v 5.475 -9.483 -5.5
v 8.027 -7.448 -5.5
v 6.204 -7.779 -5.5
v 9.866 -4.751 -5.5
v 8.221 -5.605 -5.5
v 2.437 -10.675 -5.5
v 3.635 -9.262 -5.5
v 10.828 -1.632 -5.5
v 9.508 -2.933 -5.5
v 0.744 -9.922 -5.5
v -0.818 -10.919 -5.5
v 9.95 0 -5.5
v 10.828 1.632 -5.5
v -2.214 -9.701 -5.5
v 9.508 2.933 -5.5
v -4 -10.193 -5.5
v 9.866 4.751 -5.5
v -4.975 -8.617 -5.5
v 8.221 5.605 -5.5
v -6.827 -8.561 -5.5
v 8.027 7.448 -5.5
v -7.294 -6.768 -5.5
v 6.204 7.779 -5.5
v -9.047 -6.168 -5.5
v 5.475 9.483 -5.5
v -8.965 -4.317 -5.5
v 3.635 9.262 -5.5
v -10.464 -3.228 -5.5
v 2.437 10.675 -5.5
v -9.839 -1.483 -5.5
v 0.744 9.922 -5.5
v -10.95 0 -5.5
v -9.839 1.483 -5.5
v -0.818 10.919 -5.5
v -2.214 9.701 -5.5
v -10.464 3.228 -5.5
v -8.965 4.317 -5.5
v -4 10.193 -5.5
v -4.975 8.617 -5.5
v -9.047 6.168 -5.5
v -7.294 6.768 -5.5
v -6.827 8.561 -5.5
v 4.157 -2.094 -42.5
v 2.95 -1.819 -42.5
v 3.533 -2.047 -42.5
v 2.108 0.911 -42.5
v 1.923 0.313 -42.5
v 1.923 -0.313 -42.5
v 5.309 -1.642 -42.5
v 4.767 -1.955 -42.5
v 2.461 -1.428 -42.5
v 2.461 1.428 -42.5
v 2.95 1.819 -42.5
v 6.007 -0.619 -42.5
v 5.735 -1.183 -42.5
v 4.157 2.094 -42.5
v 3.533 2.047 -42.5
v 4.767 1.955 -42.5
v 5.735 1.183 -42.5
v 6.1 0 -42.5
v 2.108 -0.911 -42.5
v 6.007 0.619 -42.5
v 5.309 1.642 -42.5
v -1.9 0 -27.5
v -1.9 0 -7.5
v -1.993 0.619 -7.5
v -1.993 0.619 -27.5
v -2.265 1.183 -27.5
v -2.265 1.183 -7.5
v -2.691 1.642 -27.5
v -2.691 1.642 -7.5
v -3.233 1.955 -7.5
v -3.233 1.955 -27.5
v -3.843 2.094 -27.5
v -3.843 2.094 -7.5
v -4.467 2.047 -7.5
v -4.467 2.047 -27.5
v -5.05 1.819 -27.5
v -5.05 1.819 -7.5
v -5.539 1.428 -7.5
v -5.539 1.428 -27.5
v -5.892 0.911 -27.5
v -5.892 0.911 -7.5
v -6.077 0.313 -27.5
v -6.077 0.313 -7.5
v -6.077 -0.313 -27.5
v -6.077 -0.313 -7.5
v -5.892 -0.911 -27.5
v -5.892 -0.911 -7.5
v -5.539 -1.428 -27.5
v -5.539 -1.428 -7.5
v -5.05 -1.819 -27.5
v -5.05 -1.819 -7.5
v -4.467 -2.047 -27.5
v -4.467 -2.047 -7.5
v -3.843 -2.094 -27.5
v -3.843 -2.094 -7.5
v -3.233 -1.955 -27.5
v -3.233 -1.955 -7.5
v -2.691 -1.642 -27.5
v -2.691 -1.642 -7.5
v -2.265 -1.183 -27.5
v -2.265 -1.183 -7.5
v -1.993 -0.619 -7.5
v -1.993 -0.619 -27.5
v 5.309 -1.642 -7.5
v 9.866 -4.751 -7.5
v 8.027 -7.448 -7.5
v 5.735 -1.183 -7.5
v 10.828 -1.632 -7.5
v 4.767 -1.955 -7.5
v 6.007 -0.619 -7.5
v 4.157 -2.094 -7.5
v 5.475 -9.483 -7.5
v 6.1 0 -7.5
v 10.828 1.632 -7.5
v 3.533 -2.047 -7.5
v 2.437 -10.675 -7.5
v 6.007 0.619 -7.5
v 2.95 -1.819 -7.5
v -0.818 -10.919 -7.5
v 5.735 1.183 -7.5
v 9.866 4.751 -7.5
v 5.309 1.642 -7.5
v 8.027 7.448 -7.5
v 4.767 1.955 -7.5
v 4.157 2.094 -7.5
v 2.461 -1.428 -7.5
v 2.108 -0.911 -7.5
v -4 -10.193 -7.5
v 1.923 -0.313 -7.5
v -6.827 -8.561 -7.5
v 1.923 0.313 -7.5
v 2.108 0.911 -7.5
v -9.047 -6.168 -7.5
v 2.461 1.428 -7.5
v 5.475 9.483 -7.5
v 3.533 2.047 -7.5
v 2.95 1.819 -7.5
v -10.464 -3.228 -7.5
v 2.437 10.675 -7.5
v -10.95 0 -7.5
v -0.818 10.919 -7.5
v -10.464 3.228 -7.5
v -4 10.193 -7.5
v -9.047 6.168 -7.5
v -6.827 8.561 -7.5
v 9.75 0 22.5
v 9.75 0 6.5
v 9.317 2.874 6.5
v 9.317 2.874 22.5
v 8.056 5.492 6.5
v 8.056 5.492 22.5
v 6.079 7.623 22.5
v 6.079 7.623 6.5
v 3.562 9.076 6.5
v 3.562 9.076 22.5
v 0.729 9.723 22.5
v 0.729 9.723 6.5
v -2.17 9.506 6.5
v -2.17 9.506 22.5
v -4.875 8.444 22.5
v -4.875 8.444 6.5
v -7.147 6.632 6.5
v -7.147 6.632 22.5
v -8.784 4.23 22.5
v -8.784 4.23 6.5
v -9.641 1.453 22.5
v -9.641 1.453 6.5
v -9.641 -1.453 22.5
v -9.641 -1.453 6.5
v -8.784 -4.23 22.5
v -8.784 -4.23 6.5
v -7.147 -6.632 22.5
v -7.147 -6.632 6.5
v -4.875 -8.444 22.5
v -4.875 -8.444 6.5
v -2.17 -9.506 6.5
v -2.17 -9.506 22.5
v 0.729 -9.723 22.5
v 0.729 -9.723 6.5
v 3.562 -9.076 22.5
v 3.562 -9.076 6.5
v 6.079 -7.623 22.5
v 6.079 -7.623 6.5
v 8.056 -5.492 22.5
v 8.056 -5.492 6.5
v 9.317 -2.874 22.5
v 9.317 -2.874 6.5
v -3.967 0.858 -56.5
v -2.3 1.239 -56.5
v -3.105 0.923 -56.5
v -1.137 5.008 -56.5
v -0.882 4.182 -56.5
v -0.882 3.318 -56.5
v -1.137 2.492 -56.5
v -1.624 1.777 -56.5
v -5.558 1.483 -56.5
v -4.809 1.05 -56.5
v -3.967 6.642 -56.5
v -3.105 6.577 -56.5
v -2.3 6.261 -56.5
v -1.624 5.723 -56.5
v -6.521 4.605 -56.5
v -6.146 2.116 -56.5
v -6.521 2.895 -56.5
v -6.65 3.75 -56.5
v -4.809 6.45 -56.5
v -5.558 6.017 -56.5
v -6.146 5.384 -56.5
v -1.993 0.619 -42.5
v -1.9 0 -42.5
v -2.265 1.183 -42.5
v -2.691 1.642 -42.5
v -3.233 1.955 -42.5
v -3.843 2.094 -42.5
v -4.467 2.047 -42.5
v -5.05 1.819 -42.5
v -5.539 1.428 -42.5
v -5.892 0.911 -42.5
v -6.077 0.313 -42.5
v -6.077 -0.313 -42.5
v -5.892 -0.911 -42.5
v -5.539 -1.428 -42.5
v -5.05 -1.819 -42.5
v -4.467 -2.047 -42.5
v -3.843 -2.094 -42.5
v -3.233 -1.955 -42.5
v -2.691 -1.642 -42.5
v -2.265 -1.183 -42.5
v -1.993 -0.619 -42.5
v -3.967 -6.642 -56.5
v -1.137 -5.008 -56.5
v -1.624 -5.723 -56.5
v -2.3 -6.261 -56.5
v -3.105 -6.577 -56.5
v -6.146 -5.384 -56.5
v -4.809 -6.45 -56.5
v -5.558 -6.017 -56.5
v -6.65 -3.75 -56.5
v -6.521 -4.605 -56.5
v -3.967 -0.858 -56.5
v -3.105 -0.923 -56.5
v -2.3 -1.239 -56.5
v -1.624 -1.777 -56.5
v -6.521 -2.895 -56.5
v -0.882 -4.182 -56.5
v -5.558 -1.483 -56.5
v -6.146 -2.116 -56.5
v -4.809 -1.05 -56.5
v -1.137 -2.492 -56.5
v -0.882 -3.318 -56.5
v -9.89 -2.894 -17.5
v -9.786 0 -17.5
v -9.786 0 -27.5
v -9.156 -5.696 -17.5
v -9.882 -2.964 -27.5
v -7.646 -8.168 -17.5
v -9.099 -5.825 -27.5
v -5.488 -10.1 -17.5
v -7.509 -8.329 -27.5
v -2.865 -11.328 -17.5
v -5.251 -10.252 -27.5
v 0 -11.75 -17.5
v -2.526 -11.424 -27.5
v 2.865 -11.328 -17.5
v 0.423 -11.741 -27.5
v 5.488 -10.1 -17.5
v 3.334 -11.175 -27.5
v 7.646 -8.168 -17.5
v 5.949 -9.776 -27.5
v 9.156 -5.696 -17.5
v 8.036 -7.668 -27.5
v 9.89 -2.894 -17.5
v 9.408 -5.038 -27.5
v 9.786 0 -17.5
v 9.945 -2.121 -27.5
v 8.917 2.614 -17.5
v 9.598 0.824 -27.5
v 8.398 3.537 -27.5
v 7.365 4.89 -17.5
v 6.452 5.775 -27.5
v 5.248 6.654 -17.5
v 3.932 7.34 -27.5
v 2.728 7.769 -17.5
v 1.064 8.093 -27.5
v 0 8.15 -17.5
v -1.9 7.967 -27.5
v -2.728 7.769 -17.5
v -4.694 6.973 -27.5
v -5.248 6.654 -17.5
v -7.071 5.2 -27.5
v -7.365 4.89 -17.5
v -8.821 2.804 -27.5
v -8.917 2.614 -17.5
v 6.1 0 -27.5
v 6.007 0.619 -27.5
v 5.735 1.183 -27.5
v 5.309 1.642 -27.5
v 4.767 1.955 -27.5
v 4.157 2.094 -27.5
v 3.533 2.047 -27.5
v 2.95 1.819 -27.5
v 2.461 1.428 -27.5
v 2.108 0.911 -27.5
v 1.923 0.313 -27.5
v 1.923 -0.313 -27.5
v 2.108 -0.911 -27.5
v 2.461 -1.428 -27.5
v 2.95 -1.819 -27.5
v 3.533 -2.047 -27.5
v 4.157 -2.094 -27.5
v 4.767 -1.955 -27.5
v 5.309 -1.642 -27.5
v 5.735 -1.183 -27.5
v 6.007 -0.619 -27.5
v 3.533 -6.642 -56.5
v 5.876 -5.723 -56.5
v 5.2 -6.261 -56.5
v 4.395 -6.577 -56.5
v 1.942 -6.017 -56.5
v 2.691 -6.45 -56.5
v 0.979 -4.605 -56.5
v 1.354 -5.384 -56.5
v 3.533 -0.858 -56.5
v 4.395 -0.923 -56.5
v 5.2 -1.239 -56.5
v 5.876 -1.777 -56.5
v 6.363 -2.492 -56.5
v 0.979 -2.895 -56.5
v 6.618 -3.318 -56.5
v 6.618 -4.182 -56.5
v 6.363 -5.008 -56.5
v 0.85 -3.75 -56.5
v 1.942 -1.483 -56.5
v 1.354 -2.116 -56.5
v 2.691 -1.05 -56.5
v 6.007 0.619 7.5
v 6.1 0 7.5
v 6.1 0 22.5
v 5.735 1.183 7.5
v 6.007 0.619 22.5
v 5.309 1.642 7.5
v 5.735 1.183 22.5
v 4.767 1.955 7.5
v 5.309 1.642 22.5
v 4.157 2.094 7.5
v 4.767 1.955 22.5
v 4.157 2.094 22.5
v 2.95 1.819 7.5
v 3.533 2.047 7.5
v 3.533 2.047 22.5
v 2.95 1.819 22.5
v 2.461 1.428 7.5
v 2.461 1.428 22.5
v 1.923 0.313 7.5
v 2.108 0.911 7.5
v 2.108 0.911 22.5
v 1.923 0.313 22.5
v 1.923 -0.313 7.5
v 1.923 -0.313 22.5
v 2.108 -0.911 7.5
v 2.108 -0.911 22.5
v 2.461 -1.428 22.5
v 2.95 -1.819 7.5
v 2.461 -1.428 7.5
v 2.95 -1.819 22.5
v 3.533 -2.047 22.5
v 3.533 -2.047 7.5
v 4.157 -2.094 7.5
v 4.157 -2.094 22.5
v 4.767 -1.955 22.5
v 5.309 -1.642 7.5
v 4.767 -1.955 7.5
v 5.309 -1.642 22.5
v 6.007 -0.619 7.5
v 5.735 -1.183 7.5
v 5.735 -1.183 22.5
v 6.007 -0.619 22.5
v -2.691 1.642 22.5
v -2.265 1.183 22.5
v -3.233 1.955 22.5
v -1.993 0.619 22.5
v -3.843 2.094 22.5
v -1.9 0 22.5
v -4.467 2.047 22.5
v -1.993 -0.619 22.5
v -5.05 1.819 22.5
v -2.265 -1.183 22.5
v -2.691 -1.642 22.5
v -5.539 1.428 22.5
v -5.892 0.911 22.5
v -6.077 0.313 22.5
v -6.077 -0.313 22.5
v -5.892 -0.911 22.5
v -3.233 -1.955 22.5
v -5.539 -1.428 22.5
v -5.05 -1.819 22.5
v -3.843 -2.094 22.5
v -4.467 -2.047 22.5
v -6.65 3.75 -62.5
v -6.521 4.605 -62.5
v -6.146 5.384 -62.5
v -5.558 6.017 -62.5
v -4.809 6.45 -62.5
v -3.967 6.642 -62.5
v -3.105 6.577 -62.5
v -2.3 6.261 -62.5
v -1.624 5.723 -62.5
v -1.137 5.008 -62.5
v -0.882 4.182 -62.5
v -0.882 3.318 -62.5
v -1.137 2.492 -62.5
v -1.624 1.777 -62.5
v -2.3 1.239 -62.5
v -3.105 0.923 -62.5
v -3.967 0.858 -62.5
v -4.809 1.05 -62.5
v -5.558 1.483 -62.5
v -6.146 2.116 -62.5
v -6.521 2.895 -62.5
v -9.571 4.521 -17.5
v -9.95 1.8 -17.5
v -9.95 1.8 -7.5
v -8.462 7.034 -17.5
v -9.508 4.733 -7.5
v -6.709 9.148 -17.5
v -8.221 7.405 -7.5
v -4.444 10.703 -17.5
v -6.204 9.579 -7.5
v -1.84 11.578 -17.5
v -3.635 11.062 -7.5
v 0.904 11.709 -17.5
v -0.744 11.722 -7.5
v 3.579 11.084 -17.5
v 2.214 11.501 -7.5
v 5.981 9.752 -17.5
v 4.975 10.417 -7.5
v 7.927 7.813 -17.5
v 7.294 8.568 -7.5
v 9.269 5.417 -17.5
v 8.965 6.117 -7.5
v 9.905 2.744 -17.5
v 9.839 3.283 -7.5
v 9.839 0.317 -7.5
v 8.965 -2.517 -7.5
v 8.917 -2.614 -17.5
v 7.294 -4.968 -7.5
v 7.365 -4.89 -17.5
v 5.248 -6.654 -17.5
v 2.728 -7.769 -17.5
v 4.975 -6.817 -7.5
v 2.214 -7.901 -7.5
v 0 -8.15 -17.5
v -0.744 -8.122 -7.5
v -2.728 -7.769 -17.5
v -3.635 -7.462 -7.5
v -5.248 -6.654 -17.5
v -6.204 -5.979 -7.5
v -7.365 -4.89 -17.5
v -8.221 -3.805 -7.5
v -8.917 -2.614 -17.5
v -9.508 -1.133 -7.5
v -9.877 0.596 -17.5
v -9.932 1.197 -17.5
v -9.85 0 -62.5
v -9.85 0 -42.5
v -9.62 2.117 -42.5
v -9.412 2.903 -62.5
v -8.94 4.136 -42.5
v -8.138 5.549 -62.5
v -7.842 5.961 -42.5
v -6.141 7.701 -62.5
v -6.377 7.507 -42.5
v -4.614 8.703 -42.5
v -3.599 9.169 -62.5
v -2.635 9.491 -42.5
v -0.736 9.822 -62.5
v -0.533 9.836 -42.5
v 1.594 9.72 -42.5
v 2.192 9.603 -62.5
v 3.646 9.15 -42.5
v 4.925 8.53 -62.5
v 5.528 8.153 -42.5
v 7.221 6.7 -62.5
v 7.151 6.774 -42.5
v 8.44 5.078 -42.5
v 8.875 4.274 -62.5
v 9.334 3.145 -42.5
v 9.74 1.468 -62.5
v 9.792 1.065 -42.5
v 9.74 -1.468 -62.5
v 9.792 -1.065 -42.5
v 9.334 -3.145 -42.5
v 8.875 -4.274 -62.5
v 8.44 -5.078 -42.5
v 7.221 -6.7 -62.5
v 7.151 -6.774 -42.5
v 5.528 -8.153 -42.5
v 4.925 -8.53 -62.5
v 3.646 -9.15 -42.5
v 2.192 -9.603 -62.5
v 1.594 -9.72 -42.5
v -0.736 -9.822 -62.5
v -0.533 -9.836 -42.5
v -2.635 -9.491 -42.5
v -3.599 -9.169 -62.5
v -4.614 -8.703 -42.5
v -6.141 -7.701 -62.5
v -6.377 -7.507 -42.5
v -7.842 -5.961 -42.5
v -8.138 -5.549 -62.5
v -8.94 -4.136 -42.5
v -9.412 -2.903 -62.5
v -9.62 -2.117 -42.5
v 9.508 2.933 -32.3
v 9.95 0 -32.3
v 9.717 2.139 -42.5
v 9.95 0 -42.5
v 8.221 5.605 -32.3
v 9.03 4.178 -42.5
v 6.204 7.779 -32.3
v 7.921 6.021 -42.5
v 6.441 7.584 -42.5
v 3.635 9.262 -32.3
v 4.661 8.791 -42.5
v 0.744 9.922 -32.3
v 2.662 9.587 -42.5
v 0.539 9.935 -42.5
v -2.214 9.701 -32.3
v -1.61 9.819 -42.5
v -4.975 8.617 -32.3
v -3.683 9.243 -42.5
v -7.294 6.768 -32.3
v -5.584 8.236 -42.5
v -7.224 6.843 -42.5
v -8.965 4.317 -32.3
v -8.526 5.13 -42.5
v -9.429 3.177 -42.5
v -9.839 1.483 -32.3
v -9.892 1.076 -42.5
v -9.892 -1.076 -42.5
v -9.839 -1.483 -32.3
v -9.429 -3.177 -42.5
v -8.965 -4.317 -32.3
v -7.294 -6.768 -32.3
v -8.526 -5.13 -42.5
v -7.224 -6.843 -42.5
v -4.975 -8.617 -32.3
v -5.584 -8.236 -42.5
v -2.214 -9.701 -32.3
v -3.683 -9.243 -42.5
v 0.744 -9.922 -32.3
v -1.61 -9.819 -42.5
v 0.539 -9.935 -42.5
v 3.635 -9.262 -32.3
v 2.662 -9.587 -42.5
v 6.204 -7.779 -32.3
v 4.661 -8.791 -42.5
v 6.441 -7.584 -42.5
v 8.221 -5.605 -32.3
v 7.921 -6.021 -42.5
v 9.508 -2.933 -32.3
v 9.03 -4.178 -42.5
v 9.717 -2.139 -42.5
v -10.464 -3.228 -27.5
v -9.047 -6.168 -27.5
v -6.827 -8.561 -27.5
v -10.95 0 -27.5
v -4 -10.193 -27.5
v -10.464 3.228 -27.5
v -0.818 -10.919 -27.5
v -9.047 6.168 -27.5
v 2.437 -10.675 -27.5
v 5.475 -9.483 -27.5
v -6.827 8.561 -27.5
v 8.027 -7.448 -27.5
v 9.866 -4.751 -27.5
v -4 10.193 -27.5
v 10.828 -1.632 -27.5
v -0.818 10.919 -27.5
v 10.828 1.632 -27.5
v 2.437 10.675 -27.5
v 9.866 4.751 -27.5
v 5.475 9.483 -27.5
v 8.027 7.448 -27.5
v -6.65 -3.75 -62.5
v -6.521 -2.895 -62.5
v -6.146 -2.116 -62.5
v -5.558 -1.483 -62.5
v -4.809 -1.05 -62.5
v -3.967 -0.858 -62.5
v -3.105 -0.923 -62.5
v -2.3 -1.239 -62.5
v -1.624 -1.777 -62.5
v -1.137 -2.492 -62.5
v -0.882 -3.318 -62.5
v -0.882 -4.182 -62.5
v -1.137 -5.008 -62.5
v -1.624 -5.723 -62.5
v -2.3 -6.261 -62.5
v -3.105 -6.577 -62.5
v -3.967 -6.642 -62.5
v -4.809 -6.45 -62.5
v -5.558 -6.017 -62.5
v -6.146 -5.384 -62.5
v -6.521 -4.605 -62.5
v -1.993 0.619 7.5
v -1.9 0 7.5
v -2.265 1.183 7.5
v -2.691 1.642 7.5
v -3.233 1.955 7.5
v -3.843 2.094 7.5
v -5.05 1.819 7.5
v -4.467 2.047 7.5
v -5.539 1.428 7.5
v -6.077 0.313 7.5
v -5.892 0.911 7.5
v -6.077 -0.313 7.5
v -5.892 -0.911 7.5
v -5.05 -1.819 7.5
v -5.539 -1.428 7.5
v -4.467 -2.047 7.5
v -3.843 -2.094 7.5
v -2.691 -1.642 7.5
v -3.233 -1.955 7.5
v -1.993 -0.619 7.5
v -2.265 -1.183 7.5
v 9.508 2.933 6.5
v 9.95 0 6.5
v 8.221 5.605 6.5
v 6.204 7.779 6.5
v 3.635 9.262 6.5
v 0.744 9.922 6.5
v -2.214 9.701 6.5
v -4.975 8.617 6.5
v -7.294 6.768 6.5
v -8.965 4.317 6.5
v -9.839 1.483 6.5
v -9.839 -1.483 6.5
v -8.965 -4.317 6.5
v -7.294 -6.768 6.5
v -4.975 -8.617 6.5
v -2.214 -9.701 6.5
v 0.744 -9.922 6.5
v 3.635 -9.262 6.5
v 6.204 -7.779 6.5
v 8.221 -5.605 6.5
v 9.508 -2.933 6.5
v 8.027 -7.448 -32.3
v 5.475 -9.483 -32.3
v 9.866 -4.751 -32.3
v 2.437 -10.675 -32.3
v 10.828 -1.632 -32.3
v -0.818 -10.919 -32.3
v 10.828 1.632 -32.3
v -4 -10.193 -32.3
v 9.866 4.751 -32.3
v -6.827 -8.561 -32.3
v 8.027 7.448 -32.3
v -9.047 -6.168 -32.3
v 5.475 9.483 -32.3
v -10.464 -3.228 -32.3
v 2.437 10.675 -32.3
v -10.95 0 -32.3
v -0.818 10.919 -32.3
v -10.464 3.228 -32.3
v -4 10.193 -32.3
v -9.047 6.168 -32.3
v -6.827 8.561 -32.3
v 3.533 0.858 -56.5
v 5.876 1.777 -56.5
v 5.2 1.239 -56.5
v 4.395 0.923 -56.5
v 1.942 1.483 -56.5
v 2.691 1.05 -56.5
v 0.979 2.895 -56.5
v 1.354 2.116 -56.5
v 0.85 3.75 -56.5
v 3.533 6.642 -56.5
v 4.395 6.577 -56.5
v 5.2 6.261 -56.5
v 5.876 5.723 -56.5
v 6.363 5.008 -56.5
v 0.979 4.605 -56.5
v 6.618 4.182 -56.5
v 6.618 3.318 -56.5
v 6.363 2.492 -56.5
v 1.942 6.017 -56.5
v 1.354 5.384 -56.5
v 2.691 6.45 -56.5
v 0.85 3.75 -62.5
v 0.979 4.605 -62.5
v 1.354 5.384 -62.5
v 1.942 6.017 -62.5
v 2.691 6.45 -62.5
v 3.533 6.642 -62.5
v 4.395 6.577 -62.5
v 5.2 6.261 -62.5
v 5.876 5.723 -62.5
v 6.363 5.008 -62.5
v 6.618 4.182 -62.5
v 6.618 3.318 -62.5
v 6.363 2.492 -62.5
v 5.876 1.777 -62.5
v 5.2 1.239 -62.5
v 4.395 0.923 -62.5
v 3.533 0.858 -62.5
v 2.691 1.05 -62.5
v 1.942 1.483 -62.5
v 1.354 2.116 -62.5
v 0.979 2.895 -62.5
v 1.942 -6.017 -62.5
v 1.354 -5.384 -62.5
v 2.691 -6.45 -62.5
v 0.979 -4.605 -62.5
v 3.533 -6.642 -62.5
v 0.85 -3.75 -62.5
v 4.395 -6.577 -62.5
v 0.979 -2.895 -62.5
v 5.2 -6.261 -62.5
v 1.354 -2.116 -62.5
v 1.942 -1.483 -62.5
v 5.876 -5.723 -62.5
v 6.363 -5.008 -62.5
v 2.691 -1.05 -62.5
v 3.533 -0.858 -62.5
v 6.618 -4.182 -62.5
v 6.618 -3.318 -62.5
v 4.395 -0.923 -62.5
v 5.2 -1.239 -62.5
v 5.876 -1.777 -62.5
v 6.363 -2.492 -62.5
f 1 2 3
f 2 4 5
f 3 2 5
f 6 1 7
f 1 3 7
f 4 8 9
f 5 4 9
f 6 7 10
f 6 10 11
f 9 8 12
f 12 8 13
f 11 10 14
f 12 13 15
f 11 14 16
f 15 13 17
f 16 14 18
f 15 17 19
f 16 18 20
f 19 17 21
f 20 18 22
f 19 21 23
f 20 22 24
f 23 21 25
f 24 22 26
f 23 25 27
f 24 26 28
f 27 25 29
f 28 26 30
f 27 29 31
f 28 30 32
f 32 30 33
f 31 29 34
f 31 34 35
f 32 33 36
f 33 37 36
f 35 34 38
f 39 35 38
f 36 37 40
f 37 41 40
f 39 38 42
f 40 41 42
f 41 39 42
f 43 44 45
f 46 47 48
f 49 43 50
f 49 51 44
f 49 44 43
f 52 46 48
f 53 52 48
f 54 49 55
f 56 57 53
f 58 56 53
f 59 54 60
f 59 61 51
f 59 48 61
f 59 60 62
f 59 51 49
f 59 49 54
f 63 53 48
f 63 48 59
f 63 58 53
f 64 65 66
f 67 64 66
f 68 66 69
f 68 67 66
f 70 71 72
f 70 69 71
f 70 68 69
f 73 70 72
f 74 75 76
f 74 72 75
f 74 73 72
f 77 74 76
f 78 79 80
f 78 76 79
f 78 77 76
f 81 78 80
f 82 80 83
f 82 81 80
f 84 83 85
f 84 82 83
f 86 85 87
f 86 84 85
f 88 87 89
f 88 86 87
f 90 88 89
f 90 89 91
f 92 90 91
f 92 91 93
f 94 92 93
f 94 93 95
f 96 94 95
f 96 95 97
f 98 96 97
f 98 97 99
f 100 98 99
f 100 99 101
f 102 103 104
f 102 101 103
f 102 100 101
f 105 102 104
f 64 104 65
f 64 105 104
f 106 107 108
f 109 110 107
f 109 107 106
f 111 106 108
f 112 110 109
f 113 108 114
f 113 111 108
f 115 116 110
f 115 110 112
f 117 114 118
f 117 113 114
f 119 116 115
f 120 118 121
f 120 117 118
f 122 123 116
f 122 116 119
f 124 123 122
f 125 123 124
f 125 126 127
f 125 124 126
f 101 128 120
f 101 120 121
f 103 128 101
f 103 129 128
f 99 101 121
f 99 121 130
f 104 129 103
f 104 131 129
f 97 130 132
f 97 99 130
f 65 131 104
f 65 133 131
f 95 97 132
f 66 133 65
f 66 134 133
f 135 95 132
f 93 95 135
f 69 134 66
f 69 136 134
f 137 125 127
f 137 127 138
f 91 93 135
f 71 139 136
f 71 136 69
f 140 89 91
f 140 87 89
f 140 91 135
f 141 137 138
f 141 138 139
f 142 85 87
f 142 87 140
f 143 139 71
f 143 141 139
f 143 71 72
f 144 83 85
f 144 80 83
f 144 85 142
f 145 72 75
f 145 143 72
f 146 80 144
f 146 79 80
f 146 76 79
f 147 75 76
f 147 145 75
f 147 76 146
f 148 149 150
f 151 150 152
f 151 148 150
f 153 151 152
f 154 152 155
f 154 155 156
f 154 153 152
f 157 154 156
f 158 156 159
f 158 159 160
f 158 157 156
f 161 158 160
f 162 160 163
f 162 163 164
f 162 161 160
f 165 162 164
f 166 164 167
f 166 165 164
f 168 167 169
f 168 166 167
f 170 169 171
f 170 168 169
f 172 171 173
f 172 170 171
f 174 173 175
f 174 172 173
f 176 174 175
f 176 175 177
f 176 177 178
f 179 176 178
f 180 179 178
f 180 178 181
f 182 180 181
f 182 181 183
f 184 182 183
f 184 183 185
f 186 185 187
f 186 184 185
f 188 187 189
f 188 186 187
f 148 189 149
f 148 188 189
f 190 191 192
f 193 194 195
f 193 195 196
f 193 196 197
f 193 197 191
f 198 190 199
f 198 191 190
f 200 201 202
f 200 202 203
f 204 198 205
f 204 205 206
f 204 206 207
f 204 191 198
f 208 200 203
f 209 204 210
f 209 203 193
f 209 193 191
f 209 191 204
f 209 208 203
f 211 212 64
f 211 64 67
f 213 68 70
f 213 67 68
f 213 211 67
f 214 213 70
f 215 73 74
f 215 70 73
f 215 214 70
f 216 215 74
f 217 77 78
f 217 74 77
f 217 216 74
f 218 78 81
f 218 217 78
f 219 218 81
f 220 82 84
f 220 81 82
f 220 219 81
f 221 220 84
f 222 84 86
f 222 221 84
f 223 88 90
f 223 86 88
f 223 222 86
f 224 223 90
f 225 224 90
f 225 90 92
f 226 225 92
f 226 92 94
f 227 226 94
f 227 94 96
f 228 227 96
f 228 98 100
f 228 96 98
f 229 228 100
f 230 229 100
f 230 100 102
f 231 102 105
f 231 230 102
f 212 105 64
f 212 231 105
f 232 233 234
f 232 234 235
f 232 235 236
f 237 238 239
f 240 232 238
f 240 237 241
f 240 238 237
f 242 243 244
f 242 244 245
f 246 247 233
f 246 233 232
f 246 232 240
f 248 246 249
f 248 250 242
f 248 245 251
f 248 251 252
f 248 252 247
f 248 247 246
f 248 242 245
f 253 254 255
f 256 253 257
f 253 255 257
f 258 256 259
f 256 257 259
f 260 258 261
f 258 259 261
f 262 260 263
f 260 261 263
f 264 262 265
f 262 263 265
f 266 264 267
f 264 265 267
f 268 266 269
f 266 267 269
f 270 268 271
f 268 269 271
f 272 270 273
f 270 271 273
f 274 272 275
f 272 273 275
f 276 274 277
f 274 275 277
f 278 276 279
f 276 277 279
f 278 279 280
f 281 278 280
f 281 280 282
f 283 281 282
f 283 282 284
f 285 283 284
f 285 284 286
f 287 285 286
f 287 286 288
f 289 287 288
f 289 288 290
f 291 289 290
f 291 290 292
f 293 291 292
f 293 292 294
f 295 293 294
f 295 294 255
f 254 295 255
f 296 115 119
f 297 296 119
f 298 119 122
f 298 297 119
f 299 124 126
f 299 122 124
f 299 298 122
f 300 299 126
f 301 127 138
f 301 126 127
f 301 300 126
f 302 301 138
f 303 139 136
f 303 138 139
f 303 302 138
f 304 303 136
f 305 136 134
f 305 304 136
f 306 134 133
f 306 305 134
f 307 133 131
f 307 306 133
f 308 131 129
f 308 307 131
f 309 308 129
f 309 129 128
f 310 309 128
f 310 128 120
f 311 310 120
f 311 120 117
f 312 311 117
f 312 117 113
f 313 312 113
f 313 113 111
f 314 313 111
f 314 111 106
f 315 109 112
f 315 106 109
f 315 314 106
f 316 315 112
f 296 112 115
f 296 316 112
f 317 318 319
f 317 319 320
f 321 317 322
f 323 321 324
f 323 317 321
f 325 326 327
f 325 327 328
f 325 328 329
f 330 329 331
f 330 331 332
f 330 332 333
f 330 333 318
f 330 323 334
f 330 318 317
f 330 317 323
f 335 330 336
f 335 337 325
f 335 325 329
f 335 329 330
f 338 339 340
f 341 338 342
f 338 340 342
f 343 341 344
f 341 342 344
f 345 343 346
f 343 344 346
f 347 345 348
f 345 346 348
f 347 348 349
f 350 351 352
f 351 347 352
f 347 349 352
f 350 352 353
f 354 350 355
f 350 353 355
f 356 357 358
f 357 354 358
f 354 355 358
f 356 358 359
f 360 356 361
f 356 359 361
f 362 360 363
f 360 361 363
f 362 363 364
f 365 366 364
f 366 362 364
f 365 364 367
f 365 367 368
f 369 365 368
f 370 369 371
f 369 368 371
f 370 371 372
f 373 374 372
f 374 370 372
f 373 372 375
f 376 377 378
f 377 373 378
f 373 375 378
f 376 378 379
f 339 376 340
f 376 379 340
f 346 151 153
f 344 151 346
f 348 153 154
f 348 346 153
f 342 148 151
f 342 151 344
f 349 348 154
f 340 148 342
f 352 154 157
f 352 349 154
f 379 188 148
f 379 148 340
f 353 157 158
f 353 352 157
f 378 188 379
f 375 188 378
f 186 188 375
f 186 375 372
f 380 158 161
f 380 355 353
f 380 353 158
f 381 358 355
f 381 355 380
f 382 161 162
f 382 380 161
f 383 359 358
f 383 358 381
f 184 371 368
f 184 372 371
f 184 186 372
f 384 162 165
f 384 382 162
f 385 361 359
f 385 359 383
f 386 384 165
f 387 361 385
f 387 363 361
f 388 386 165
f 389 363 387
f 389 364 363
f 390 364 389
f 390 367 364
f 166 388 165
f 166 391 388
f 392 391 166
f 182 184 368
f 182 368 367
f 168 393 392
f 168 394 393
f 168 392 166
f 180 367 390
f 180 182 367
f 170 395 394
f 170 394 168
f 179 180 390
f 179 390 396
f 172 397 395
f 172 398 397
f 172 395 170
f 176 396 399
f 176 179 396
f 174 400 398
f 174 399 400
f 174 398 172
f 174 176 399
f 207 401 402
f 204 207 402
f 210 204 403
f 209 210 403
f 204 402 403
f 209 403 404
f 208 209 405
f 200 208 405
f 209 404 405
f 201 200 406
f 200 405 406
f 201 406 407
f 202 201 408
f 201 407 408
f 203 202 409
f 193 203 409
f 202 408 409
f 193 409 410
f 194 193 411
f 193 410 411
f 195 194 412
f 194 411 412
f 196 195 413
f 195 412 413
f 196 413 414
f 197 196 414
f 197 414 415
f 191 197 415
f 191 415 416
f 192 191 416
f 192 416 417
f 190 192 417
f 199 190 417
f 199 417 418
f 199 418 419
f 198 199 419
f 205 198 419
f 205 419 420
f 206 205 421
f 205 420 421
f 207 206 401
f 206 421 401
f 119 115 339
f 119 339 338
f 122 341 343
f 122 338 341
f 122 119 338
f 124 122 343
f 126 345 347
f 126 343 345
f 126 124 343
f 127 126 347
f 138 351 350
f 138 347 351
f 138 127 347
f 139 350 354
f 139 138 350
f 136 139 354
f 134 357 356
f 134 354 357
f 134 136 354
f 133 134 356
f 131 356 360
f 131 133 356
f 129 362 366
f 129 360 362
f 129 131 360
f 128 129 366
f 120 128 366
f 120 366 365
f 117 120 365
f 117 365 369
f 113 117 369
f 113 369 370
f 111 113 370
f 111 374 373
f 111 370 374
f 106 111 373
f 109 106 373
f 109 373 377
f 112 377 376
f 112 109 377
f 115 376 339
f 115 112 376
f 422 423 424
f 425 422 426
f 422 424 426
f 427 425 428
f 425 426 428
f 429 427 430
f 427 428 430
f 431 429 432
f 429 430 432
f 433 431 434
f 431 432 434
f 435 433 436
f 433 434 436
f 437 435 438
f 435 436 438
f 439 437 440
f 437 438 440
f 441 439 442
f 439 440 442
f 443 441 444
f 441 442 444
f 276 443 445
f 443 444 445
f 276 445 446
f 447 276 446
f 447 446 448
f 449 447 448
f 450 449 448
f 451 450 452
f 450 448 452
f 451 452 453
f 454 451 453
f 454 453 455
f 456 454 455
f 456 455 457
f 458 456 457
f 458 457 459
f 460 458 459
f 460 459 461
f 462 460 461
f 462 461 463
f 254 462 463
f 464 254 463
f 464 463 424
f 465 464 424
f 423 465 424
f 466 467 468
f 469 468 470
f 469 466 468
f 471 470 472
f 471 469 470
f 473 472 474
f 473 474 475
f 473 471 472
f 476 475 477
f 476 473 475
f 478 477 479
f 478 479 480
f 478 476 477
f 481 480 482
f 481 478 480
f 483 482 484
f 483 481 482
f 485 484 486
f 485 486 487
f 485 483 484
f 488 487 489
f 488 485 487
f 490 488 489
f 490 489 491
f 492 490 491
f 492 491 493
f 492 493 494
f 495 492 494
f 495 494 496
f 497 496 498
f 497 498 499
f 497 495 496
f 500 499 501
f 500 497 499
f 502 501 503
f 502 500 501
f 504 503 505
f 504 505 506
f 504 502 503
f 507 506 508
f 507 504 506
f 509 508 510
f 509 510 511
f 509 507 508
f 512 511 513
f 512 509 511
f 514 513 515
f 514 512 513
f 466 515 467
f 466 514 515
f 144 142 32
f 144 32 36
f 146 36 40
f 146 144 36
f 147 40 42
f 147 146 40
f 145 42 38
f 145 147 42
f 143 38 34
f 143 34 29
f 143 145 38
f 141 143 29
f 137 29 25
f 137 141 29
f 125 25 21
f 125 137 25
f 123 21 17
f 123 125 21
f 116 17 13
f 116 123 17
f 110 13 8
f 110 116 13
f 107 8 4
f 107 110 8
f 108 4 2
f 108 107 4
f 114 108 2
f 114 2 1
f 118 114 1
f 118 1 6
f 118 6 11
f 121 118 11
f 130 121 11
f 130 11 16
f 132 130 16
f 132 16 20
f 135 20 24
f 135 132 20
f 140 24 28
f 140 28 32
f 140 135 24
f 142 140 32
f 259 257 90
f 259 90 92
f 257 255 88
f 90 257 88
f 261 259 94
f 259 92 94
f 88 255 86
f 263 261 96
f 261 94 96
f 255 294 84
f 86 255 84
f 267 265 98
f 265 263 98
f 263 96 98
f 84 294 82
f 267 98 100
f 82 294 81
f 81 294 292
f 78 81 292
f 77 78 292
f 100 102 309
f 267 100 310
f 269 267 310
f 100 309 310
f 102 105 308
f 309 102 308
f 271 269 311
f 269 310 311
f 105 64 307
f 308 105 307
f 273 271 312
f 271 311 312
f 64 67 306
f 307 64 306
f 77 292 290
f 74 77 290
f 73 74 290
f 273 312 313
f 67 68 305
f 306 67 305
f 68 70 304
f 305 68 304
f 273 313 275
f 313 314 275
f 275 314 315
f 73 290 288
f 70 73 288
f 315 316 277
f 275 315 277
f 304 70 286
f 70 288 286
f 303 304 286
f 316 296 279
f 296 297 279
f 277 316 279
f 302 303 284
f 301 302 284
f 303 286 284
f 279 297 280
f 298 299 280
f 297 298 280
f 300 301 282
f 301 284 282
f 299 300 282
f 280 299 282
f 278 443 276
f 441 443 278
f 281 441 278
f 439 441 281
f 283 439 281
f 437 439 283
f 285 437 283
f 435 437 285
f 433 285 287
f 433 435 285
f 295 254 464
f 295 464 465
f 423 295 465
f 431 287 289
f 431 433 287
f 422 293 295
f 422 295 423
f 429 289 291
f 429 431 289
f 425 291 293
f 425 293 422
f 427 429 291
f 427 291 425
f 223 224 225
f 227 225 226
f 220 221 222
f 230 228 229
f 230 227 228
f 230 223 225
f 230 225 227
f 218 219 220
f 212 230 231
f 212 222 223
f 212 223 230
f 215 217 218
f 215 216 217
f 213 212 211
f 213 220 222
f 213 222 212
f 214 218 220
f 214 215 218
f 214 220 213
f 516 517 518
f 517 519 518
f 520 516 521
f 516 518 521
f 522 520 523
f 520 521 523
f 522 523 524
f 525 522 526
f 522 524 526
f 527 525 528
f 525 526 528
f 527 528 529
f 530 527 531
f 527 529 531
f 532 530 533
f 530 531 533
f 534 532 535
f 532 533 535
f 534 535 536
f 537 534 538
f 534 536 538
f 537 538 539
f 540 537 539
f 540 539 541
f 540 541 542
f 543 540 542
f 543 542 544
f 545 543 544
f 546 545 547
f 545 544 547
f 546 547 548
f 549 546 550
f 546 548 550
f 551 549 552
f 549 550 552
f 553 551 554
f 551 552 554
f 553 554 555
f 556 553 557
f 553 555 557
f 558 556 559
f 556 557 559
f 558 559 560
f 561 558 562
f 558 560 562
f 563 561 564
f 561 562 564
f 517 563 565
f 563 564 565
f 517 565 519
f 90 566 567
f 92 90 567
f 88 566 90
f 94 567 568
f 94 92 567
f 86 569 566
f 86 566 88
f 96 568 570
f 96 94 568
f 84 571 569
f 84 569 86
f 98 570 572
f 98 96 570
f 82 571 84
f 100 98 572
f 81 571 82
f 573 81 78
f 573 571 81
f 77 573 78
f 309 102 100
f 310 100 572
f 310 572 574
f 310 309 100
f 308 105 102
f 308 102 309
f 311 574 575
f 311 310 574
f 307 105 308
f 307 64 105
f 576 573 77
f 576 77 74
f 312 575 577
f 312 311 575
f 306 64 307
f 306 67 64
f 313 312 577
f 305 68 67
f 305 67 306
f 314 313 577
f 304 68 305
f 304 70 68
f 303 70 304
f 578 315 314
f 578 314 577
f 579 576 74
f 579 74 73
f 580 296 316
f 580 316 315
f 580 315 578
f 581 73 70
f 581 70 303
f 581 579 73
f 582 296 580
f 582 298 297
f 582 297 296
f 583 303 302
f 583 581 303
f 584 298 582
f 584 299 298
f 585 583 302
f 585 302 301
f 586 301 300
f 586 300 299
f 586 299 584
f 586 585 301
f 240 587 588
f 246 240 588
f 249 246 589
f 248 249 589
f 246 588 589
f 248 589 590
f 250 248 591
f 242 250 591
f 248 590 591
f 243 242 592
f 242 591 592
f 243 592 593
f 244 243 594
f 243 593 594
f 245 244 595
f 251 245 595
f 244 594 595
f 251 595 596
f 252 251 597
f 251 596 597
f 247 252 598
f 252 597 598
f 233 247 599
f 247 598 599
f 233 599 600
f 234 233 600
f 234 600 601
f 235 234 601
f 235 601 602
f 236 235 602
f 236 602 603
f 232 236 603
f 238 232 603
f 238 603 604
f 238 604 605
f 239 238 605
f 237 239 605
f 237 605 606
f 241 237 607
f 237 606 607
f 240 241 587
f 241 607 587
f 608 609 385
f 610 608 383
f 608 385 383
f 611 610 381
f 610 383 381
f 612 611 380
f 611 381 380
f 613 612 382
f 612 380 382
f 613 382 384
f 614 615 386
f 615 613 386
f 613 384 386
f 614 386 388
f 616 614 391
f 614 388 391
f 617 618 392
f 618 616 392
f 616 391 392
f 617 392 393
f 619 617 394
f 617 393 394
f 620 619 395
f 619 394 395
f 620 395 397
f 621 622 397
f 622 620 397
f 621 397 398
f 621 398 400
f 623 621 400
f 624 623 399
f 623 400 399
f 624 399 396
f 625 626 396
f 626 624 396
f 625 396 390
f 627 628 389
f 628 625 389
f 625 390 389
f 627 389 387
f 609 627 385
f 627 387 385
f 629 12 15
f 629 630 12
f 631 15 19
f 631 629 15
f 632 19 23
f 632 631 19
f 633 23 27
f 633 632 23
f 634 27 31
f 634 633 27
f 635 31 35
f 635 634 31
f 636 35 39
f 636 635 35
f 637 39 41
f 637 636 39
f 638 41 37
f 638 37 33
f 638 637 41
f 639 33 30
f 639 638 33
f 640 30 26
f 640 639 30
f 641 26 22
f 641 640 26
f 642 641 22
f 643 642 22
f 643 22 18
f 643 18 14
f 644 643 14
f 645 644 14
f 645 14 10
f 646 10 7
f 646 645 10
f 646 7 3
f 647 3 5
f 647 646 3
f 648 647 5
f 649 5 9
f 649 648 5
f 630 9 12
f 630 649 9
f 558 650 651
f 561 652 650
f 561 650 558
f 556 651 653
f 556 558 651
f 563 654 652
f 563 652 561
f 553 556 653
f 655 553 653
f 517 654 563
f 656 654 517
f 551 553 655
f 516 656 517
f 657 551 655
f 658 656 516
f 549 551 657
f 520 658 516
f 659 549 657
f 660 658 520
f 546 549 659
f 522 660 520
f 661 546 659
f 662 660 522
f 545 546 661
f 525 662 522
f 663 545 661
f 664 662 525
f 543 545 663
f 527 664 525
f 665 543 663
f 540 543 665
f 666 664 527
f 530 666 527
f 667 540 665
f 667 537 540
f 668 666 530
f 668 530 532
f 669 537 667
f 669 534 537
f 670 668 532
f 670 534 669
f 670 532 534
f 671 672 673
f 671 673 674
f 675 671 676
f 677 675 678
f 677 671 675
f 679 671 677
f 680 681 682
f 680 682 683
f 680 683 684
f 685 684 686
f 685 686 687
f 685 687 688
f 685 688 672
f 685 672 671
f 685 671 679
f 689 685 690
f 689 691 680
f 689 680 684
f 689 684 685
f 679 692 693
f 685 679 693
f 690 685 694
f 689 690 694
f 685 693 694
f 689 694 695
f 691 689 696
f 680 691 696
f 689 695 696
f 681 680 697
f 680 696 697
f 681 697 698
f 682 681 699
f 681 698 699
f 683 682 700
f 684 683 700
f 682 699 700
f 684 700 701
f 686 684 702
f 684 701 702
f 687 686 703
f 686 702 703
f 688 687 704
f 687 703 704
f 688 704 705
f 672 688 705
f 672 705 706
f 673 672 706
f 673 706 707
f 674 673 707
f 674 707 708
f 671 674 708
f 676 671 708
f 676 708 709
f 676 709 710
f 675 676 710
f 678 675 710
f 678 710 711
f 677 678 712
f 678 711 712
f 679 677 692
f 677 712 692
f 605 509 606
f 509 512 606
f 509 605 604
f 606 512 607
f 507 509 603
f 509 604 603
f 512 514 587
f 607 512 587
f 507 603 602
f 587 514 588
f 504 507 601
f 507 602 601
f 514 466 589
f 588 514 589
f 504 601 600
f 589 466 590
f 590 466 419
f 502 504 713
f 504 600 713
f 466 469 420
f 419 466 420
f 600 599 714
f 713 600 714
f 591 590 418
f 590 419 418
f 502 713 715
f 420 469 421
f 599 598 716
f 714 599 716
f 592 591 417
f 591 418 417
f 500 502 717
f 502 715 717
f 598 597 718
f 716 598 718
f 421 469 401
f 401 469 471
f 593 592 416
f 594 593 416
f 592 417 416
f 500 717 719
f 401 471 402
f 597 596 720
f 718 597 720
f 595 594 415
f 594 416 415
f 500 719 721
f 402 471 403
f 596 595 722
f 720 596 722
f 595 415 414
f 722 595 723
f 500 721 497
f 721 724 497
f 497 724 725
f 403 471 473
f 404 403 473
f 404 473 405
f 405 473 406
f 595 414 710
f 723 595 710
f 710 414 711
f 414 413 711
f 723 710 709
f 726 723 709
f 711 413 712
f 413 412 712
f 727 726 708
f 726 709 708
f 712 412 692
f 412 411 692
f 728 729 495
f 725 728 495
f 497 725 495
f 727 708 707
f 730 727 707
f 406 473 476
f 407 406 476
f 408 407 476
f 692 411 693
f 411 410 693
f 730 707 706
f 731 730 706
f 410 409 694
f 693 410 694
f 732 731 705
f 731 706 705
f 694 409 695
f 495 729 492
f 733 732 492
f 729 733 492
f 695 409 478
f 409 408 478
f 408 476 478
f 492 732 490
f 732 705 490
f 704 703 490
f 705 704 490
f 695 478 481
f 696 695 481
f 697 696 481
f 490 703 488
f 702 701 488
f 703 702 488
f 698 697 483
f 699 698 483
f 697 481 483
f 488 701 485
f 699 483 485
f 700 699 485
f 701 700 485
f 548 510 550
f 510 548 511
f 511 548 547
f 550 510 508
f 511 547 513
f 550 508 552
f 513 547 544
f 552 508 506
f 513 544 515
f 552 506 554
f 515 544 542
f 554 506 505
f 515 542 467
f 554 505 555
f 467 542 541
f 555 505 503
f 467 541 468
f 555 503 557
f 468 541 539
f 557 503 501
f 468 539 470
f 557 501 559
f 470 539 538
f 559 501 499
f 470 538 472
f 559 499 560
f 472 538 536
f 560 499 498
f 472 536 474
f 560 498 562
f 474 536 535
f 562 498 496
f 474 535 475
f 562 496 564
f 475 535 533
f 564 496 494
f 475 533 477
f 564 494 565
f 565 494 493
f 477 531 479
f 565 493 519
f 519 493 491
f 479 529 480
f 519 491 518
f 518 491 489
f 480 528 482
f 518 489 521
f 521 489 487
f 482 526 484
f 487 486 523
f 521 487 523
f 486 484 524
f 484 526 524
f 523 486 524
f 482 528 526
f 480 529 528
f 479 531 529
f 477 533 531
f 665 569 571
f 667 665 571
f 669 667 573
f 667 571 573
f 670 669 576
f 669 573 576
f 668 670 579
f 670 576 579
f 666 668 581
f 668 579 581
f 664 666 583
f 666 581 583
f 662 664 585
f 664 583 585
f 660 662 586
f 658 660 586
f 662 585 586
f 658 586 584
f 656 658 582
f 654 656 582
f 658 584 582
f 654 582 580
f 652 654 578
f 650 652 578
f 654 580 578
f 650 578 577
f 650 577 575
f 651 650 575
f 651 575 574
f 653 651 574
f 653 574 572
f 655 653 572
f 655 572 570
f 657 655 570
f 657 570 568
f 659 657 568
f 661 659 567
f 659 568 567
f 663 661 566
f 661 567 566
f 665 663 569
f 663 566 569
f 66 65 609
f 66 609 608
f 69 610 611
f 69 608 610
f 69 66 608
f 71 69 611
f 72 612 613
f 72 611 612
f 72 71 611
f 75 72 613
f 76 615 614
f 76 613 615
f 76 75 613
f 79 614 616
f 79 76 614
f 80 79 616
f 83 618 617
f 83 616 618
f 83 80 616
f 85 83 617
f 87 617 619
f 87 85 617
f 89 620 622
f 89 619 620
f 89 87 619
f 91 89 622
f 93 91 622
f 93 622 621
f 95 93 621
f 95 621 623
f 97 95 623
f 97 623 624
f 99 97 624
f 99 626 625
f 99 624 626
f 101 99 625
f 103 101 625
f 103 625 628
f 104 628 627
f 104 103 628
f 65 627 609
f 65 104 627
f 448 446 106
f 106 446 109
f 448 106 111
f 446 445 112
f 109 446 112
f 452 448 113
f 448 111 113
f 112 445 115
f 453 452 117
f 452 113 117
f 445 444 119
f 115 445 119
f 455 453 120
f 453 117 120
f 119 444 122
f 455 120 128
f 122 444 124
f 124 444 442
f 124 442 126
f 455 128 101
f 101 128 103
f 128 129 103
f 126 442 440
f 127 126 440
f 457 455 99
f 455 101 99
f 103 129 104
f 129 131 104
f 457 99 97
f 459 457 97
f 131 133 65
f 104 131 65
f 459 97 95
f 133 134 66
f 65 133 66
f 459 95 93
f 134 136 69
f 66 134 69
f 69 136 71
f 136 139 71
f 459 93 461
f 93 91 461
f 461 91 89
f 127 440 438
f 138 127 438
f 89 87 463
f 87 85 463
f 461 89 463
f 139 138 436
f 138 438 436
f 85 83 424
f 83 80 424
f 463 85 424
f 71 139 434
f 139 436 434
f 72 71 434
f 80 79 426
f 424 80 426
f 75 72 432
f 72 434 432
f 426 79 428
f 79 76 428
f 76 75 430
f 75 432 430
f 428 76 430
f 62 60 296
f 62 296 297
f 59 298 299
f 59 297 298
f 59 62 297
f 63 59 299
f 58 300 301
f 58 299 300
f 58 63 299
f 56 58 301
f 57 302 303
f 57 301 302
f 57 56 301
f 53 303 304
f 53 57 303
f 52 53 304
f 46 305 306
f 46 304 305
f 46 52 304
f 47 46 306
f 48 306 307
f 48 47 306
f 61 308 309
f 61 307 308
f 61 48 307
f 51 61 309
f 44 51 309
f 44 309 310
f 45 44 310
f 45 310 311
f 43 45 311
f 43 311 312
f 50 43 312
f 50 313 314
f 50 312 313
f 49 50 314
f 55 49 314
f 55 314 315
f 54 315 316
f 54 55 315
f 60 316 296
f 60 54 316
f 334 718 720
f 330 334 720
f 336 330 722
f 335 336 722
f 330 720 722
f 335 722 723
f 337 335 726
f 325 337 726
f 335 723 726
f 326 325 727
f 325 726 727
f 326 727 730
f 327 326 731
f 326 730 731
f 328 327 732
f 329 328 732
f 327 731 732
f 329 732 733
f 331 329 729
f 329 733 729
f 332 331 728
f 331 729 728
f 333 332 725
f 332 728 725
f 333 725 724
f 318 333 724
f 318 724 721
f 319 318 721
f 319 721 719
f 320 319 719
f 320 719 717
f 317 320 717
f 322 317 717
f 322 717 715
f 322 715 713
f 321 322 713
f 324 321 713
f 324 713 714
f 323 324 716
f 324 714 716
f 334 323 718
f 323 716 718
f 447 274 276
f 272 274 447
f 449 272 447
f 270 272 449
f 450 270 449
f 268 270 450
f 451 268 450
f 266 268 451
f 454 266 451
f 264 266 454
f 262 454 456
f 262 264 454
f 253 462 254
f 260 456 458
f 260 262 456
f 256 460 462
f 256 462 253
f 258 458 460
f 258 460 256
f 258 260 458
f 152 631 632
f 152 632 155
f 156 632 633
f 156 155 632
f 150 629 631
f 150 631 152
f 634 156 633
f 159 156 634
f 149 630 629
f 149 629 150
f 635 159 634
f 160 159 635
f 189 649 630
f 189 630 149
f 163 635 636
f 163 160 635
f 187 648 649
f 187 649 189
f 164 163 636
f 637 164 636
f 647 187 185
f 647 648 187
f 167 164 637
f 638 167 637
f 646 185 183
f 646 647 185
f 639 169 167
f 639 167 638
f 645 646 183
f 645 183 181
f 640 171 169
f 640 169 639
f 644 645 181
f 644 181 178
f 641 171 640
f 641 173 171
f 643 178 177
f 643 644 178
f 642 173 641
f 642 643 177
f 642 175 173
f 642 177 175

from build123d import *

# Parameters (mm, degrees)
SKETCH1_R                   = 9.95
CENTRAL_INPUT_JOURNAL_DEPTH = 7.5
SKETCH8_R                   = 10.95
RIM_DEPTH                   = 2
SKETCH2_R                   = 9.95
ECCENTRIC_JOURNAL_DEPTH     = 10
BACK_START                  = 2.8
SKETCH16_R                  = 10.95
BACK_RIM_EXTENSION_DEPTH    = 2.8
SKETCH4_R                   = 9.95
ECCENTRIC_JOURNAL_2_DEPTH   = 10
M4_BOLTS_HOLE_DEPTH         = 46.433632917
M4_BOLTS_HOLE_DEPTH_BACK    = 46.433632917
SKETCH7_R                   = 2.1
SKETCH12_W                  = 20
SKETCH12_H                  = 9.85
SKETCH15_R                  = 2.9
INPUTTHREADEDINSERTS_DEPTH  = 6
FRONTJOURNALEXTENSION_START = 15
SKETCH14_R                  = 9.95
SKETCH14_R_2                = 2.1
FRONTJOURNALEXTENSION_DEPTH = 15
SKETCH17_R                  = 9.95
SKETCH17_R_2                = 9.75
OUTPUTTHROUGH_DEPTH         = 16


# Read off the part's stored shape, not the designer's step: Split1
with BuildPart() as part:
    # Sketch1 → Central Input Journal (new, symmetric)
    with BuildSketch(Plane.XY):
        Circle(SKETCH1_R)
    extrude(amount=CENTRAL_INPUT_JOURNAL_DEPTH, both=True)

    # Sketch8 → Rim (add)
    with BuildSketch(Plane(origin=(0, 0, -7.5), x_dir=(-1, 0, 0), z_dir=(0, 0, -1))):
        Circle(SKETCH8_R)
    extrude(amount=-RIM_DEPTH)


with BuildPart() as body_2:
    # Sketch2 → Eccentric Journal (new body)
    with BuildSketch(Plane(origin=(0, 0, -7.5), x_dir=(-1, 0, 0), z_dir=(0, 0, -1))):
        with Locations((0, 1.8)):
            Circle(SKETCH2_R)
    extrude(amount=ECCENTRIC_JOURNAL_DEPTH)



with BuildPart() as body_3:
    # Central Journal Back: mirrored copy
    add(part.part.mirror(Plane(origin=(0, 1.8, -17.5), x_dir=(1, 0, 0), z_dir=(0, 0, -1))))

    # Sketch16 → Back Rim Extension (add)
    with BuildSketch(Plane(origin=(0, 0, -29.5), x_dir=(-1, 0, 0), z_dir=(0, 0, -1)).offset(BACK_START)):
        Circle(SKETCH16_R)
    extrude(amount=-BACK_RIM_EXTENSION_DEPTH)


with BuildPart() as body_2_1:
    add(body_2.part)

    add(body_3.part)  # Eccentric Journal 2 merges body 3
    # Sketch4 → Eccentric Journal 2 (add)
    with BuildSketch(Plane.XY.offset(-27.5)):
        with Locations(Location((0, -1.8, 0), (0, 0, 169.577549887))):
            Circle(SKETCH4_R)
    extrude(amount=ECCENTRIC_JOURNAL_2_DEPTH)


with BuildPart() as m4_bolts_hole_tool:
    # Sketch7 → M4 Bolts Hole (new, two sides: drawn at the far end of the back side and taken through both)
    with BuildSketch(Plane.XY.offset(-M4_BOLTS_HOLE_DEPTH_BACK)):
        with Locations((-4, 0)):
            Circle(SKETCH7_R)
        with Locations((4, 0)):
            Circle(SKETCH7_R)
    extrude(amount=M4_BOLTS_HOLE_DEPTH + M4_BOLTS_HOLE_DEPTH_BACK)


with BuildPart() as part_1:
    add(part.part)

    # M4 Bolts Hole: cut by m4_bolts_hole_tool
    add(m4_bolts_hole_tool.part, mode=Mode.SUBTRACT)

    # Sketch14 → FrontJournalExtension (add)
    with BuildSketch(Plane.XY.offset(7.5).offset(FRONTJOURNALEXTENSION_START)):
        with Locations(Location((0, 0, 0), (0, 0, 180))):
            Circle(SKETCH14_R)
        with Locations((4, 0)):
            Circle(SKETCH14_R_2, mode=Mode.SUBTRACT)
        with Locations((-4, 0)):
            Circle(SKETCH14_R_2, mode=Mode.SUBTRACT)
    extrude(amount=-FRONTJOURNALEXTENSION_DEPTH)

    # Sketch17 → OutputThrough (cut)
    with BuildSketch(Plane.XY.offset(22.5)):
        with Locations(Location((0, 0, 0), (0, 0, 180))):
            Circle(SKETCH17_R)
        Circle(SKETCH17_R_2, mode=Mode.SUBTRACT)
    extrude(amount=-OUTPUTTHROUGH_DEPTH, mode=Mode.SUBTRACT)


with BuildPart() as body_2_2:
    add(body_2_1.part)

    # M4 Bolts Hole: cut by m4_bolts_hole_tool
    add(m4_bolts_hole_tool.part, mode=Mode.SUBTRACT)

    # Sketch12 → Input Shaft (revolve)
    with BuildSketch(Plane(origin=(0, 0, 0), x_dir=(0, 0, -1), z_dir=(1, 0, 0)), mode=Mode.PRIVATE) as input_shaft_sk:
        with Locations((52.5, 4.925)):
            Rectangle(SKETCH12_W, SKETCH12_H)
    revolve(input_shaft_sk.sketch.rotate(Axis((0, 0, 15.306648382), (0, 0, -1)), 270), axis=Axis((0, 0, 15.306648382), (0, 0, -1)))

    # Sketch15 → InputThreadedInserts (cut)
    with BuildSketch(Plane(origin=(0, 0, -62.5), x_dir=(-1, 0, 0), z_dir=(0, 0, -1))):
        with Locations((-3.75, 3.75)):
            Circle(SKETCH15_R)
        with Locations((3.75, 3.75)):
            Circle(SKETCH15_R)
        with Locations((3.75, -3.75)):
            Circle(SKETCH15_R)
        with Locations((-3.75, -3.75)):
            Circle(SKETCH15_R)
    extrude(amount=-INPUTTHREADEDINSERTS_DEPTH, mode=Mode.SUBTRACT)


with BuildPart() as body_3_2:
    # Split1: the piece on the far side of the plane
    add(body_2_2.part)
    split(bisect_by=Plane.XY.offset(-27.5), keep=Keep.BOTTOM)


with BuildPart() as body_2_3:
    add(body_2_2.part)

    # Split1
    split(bisect_by=Plane.XY.offset(-27.5), keep=Keep.TOP)


solid = Compound([part_1.part, body_3_2.part, body_2_3.part])
